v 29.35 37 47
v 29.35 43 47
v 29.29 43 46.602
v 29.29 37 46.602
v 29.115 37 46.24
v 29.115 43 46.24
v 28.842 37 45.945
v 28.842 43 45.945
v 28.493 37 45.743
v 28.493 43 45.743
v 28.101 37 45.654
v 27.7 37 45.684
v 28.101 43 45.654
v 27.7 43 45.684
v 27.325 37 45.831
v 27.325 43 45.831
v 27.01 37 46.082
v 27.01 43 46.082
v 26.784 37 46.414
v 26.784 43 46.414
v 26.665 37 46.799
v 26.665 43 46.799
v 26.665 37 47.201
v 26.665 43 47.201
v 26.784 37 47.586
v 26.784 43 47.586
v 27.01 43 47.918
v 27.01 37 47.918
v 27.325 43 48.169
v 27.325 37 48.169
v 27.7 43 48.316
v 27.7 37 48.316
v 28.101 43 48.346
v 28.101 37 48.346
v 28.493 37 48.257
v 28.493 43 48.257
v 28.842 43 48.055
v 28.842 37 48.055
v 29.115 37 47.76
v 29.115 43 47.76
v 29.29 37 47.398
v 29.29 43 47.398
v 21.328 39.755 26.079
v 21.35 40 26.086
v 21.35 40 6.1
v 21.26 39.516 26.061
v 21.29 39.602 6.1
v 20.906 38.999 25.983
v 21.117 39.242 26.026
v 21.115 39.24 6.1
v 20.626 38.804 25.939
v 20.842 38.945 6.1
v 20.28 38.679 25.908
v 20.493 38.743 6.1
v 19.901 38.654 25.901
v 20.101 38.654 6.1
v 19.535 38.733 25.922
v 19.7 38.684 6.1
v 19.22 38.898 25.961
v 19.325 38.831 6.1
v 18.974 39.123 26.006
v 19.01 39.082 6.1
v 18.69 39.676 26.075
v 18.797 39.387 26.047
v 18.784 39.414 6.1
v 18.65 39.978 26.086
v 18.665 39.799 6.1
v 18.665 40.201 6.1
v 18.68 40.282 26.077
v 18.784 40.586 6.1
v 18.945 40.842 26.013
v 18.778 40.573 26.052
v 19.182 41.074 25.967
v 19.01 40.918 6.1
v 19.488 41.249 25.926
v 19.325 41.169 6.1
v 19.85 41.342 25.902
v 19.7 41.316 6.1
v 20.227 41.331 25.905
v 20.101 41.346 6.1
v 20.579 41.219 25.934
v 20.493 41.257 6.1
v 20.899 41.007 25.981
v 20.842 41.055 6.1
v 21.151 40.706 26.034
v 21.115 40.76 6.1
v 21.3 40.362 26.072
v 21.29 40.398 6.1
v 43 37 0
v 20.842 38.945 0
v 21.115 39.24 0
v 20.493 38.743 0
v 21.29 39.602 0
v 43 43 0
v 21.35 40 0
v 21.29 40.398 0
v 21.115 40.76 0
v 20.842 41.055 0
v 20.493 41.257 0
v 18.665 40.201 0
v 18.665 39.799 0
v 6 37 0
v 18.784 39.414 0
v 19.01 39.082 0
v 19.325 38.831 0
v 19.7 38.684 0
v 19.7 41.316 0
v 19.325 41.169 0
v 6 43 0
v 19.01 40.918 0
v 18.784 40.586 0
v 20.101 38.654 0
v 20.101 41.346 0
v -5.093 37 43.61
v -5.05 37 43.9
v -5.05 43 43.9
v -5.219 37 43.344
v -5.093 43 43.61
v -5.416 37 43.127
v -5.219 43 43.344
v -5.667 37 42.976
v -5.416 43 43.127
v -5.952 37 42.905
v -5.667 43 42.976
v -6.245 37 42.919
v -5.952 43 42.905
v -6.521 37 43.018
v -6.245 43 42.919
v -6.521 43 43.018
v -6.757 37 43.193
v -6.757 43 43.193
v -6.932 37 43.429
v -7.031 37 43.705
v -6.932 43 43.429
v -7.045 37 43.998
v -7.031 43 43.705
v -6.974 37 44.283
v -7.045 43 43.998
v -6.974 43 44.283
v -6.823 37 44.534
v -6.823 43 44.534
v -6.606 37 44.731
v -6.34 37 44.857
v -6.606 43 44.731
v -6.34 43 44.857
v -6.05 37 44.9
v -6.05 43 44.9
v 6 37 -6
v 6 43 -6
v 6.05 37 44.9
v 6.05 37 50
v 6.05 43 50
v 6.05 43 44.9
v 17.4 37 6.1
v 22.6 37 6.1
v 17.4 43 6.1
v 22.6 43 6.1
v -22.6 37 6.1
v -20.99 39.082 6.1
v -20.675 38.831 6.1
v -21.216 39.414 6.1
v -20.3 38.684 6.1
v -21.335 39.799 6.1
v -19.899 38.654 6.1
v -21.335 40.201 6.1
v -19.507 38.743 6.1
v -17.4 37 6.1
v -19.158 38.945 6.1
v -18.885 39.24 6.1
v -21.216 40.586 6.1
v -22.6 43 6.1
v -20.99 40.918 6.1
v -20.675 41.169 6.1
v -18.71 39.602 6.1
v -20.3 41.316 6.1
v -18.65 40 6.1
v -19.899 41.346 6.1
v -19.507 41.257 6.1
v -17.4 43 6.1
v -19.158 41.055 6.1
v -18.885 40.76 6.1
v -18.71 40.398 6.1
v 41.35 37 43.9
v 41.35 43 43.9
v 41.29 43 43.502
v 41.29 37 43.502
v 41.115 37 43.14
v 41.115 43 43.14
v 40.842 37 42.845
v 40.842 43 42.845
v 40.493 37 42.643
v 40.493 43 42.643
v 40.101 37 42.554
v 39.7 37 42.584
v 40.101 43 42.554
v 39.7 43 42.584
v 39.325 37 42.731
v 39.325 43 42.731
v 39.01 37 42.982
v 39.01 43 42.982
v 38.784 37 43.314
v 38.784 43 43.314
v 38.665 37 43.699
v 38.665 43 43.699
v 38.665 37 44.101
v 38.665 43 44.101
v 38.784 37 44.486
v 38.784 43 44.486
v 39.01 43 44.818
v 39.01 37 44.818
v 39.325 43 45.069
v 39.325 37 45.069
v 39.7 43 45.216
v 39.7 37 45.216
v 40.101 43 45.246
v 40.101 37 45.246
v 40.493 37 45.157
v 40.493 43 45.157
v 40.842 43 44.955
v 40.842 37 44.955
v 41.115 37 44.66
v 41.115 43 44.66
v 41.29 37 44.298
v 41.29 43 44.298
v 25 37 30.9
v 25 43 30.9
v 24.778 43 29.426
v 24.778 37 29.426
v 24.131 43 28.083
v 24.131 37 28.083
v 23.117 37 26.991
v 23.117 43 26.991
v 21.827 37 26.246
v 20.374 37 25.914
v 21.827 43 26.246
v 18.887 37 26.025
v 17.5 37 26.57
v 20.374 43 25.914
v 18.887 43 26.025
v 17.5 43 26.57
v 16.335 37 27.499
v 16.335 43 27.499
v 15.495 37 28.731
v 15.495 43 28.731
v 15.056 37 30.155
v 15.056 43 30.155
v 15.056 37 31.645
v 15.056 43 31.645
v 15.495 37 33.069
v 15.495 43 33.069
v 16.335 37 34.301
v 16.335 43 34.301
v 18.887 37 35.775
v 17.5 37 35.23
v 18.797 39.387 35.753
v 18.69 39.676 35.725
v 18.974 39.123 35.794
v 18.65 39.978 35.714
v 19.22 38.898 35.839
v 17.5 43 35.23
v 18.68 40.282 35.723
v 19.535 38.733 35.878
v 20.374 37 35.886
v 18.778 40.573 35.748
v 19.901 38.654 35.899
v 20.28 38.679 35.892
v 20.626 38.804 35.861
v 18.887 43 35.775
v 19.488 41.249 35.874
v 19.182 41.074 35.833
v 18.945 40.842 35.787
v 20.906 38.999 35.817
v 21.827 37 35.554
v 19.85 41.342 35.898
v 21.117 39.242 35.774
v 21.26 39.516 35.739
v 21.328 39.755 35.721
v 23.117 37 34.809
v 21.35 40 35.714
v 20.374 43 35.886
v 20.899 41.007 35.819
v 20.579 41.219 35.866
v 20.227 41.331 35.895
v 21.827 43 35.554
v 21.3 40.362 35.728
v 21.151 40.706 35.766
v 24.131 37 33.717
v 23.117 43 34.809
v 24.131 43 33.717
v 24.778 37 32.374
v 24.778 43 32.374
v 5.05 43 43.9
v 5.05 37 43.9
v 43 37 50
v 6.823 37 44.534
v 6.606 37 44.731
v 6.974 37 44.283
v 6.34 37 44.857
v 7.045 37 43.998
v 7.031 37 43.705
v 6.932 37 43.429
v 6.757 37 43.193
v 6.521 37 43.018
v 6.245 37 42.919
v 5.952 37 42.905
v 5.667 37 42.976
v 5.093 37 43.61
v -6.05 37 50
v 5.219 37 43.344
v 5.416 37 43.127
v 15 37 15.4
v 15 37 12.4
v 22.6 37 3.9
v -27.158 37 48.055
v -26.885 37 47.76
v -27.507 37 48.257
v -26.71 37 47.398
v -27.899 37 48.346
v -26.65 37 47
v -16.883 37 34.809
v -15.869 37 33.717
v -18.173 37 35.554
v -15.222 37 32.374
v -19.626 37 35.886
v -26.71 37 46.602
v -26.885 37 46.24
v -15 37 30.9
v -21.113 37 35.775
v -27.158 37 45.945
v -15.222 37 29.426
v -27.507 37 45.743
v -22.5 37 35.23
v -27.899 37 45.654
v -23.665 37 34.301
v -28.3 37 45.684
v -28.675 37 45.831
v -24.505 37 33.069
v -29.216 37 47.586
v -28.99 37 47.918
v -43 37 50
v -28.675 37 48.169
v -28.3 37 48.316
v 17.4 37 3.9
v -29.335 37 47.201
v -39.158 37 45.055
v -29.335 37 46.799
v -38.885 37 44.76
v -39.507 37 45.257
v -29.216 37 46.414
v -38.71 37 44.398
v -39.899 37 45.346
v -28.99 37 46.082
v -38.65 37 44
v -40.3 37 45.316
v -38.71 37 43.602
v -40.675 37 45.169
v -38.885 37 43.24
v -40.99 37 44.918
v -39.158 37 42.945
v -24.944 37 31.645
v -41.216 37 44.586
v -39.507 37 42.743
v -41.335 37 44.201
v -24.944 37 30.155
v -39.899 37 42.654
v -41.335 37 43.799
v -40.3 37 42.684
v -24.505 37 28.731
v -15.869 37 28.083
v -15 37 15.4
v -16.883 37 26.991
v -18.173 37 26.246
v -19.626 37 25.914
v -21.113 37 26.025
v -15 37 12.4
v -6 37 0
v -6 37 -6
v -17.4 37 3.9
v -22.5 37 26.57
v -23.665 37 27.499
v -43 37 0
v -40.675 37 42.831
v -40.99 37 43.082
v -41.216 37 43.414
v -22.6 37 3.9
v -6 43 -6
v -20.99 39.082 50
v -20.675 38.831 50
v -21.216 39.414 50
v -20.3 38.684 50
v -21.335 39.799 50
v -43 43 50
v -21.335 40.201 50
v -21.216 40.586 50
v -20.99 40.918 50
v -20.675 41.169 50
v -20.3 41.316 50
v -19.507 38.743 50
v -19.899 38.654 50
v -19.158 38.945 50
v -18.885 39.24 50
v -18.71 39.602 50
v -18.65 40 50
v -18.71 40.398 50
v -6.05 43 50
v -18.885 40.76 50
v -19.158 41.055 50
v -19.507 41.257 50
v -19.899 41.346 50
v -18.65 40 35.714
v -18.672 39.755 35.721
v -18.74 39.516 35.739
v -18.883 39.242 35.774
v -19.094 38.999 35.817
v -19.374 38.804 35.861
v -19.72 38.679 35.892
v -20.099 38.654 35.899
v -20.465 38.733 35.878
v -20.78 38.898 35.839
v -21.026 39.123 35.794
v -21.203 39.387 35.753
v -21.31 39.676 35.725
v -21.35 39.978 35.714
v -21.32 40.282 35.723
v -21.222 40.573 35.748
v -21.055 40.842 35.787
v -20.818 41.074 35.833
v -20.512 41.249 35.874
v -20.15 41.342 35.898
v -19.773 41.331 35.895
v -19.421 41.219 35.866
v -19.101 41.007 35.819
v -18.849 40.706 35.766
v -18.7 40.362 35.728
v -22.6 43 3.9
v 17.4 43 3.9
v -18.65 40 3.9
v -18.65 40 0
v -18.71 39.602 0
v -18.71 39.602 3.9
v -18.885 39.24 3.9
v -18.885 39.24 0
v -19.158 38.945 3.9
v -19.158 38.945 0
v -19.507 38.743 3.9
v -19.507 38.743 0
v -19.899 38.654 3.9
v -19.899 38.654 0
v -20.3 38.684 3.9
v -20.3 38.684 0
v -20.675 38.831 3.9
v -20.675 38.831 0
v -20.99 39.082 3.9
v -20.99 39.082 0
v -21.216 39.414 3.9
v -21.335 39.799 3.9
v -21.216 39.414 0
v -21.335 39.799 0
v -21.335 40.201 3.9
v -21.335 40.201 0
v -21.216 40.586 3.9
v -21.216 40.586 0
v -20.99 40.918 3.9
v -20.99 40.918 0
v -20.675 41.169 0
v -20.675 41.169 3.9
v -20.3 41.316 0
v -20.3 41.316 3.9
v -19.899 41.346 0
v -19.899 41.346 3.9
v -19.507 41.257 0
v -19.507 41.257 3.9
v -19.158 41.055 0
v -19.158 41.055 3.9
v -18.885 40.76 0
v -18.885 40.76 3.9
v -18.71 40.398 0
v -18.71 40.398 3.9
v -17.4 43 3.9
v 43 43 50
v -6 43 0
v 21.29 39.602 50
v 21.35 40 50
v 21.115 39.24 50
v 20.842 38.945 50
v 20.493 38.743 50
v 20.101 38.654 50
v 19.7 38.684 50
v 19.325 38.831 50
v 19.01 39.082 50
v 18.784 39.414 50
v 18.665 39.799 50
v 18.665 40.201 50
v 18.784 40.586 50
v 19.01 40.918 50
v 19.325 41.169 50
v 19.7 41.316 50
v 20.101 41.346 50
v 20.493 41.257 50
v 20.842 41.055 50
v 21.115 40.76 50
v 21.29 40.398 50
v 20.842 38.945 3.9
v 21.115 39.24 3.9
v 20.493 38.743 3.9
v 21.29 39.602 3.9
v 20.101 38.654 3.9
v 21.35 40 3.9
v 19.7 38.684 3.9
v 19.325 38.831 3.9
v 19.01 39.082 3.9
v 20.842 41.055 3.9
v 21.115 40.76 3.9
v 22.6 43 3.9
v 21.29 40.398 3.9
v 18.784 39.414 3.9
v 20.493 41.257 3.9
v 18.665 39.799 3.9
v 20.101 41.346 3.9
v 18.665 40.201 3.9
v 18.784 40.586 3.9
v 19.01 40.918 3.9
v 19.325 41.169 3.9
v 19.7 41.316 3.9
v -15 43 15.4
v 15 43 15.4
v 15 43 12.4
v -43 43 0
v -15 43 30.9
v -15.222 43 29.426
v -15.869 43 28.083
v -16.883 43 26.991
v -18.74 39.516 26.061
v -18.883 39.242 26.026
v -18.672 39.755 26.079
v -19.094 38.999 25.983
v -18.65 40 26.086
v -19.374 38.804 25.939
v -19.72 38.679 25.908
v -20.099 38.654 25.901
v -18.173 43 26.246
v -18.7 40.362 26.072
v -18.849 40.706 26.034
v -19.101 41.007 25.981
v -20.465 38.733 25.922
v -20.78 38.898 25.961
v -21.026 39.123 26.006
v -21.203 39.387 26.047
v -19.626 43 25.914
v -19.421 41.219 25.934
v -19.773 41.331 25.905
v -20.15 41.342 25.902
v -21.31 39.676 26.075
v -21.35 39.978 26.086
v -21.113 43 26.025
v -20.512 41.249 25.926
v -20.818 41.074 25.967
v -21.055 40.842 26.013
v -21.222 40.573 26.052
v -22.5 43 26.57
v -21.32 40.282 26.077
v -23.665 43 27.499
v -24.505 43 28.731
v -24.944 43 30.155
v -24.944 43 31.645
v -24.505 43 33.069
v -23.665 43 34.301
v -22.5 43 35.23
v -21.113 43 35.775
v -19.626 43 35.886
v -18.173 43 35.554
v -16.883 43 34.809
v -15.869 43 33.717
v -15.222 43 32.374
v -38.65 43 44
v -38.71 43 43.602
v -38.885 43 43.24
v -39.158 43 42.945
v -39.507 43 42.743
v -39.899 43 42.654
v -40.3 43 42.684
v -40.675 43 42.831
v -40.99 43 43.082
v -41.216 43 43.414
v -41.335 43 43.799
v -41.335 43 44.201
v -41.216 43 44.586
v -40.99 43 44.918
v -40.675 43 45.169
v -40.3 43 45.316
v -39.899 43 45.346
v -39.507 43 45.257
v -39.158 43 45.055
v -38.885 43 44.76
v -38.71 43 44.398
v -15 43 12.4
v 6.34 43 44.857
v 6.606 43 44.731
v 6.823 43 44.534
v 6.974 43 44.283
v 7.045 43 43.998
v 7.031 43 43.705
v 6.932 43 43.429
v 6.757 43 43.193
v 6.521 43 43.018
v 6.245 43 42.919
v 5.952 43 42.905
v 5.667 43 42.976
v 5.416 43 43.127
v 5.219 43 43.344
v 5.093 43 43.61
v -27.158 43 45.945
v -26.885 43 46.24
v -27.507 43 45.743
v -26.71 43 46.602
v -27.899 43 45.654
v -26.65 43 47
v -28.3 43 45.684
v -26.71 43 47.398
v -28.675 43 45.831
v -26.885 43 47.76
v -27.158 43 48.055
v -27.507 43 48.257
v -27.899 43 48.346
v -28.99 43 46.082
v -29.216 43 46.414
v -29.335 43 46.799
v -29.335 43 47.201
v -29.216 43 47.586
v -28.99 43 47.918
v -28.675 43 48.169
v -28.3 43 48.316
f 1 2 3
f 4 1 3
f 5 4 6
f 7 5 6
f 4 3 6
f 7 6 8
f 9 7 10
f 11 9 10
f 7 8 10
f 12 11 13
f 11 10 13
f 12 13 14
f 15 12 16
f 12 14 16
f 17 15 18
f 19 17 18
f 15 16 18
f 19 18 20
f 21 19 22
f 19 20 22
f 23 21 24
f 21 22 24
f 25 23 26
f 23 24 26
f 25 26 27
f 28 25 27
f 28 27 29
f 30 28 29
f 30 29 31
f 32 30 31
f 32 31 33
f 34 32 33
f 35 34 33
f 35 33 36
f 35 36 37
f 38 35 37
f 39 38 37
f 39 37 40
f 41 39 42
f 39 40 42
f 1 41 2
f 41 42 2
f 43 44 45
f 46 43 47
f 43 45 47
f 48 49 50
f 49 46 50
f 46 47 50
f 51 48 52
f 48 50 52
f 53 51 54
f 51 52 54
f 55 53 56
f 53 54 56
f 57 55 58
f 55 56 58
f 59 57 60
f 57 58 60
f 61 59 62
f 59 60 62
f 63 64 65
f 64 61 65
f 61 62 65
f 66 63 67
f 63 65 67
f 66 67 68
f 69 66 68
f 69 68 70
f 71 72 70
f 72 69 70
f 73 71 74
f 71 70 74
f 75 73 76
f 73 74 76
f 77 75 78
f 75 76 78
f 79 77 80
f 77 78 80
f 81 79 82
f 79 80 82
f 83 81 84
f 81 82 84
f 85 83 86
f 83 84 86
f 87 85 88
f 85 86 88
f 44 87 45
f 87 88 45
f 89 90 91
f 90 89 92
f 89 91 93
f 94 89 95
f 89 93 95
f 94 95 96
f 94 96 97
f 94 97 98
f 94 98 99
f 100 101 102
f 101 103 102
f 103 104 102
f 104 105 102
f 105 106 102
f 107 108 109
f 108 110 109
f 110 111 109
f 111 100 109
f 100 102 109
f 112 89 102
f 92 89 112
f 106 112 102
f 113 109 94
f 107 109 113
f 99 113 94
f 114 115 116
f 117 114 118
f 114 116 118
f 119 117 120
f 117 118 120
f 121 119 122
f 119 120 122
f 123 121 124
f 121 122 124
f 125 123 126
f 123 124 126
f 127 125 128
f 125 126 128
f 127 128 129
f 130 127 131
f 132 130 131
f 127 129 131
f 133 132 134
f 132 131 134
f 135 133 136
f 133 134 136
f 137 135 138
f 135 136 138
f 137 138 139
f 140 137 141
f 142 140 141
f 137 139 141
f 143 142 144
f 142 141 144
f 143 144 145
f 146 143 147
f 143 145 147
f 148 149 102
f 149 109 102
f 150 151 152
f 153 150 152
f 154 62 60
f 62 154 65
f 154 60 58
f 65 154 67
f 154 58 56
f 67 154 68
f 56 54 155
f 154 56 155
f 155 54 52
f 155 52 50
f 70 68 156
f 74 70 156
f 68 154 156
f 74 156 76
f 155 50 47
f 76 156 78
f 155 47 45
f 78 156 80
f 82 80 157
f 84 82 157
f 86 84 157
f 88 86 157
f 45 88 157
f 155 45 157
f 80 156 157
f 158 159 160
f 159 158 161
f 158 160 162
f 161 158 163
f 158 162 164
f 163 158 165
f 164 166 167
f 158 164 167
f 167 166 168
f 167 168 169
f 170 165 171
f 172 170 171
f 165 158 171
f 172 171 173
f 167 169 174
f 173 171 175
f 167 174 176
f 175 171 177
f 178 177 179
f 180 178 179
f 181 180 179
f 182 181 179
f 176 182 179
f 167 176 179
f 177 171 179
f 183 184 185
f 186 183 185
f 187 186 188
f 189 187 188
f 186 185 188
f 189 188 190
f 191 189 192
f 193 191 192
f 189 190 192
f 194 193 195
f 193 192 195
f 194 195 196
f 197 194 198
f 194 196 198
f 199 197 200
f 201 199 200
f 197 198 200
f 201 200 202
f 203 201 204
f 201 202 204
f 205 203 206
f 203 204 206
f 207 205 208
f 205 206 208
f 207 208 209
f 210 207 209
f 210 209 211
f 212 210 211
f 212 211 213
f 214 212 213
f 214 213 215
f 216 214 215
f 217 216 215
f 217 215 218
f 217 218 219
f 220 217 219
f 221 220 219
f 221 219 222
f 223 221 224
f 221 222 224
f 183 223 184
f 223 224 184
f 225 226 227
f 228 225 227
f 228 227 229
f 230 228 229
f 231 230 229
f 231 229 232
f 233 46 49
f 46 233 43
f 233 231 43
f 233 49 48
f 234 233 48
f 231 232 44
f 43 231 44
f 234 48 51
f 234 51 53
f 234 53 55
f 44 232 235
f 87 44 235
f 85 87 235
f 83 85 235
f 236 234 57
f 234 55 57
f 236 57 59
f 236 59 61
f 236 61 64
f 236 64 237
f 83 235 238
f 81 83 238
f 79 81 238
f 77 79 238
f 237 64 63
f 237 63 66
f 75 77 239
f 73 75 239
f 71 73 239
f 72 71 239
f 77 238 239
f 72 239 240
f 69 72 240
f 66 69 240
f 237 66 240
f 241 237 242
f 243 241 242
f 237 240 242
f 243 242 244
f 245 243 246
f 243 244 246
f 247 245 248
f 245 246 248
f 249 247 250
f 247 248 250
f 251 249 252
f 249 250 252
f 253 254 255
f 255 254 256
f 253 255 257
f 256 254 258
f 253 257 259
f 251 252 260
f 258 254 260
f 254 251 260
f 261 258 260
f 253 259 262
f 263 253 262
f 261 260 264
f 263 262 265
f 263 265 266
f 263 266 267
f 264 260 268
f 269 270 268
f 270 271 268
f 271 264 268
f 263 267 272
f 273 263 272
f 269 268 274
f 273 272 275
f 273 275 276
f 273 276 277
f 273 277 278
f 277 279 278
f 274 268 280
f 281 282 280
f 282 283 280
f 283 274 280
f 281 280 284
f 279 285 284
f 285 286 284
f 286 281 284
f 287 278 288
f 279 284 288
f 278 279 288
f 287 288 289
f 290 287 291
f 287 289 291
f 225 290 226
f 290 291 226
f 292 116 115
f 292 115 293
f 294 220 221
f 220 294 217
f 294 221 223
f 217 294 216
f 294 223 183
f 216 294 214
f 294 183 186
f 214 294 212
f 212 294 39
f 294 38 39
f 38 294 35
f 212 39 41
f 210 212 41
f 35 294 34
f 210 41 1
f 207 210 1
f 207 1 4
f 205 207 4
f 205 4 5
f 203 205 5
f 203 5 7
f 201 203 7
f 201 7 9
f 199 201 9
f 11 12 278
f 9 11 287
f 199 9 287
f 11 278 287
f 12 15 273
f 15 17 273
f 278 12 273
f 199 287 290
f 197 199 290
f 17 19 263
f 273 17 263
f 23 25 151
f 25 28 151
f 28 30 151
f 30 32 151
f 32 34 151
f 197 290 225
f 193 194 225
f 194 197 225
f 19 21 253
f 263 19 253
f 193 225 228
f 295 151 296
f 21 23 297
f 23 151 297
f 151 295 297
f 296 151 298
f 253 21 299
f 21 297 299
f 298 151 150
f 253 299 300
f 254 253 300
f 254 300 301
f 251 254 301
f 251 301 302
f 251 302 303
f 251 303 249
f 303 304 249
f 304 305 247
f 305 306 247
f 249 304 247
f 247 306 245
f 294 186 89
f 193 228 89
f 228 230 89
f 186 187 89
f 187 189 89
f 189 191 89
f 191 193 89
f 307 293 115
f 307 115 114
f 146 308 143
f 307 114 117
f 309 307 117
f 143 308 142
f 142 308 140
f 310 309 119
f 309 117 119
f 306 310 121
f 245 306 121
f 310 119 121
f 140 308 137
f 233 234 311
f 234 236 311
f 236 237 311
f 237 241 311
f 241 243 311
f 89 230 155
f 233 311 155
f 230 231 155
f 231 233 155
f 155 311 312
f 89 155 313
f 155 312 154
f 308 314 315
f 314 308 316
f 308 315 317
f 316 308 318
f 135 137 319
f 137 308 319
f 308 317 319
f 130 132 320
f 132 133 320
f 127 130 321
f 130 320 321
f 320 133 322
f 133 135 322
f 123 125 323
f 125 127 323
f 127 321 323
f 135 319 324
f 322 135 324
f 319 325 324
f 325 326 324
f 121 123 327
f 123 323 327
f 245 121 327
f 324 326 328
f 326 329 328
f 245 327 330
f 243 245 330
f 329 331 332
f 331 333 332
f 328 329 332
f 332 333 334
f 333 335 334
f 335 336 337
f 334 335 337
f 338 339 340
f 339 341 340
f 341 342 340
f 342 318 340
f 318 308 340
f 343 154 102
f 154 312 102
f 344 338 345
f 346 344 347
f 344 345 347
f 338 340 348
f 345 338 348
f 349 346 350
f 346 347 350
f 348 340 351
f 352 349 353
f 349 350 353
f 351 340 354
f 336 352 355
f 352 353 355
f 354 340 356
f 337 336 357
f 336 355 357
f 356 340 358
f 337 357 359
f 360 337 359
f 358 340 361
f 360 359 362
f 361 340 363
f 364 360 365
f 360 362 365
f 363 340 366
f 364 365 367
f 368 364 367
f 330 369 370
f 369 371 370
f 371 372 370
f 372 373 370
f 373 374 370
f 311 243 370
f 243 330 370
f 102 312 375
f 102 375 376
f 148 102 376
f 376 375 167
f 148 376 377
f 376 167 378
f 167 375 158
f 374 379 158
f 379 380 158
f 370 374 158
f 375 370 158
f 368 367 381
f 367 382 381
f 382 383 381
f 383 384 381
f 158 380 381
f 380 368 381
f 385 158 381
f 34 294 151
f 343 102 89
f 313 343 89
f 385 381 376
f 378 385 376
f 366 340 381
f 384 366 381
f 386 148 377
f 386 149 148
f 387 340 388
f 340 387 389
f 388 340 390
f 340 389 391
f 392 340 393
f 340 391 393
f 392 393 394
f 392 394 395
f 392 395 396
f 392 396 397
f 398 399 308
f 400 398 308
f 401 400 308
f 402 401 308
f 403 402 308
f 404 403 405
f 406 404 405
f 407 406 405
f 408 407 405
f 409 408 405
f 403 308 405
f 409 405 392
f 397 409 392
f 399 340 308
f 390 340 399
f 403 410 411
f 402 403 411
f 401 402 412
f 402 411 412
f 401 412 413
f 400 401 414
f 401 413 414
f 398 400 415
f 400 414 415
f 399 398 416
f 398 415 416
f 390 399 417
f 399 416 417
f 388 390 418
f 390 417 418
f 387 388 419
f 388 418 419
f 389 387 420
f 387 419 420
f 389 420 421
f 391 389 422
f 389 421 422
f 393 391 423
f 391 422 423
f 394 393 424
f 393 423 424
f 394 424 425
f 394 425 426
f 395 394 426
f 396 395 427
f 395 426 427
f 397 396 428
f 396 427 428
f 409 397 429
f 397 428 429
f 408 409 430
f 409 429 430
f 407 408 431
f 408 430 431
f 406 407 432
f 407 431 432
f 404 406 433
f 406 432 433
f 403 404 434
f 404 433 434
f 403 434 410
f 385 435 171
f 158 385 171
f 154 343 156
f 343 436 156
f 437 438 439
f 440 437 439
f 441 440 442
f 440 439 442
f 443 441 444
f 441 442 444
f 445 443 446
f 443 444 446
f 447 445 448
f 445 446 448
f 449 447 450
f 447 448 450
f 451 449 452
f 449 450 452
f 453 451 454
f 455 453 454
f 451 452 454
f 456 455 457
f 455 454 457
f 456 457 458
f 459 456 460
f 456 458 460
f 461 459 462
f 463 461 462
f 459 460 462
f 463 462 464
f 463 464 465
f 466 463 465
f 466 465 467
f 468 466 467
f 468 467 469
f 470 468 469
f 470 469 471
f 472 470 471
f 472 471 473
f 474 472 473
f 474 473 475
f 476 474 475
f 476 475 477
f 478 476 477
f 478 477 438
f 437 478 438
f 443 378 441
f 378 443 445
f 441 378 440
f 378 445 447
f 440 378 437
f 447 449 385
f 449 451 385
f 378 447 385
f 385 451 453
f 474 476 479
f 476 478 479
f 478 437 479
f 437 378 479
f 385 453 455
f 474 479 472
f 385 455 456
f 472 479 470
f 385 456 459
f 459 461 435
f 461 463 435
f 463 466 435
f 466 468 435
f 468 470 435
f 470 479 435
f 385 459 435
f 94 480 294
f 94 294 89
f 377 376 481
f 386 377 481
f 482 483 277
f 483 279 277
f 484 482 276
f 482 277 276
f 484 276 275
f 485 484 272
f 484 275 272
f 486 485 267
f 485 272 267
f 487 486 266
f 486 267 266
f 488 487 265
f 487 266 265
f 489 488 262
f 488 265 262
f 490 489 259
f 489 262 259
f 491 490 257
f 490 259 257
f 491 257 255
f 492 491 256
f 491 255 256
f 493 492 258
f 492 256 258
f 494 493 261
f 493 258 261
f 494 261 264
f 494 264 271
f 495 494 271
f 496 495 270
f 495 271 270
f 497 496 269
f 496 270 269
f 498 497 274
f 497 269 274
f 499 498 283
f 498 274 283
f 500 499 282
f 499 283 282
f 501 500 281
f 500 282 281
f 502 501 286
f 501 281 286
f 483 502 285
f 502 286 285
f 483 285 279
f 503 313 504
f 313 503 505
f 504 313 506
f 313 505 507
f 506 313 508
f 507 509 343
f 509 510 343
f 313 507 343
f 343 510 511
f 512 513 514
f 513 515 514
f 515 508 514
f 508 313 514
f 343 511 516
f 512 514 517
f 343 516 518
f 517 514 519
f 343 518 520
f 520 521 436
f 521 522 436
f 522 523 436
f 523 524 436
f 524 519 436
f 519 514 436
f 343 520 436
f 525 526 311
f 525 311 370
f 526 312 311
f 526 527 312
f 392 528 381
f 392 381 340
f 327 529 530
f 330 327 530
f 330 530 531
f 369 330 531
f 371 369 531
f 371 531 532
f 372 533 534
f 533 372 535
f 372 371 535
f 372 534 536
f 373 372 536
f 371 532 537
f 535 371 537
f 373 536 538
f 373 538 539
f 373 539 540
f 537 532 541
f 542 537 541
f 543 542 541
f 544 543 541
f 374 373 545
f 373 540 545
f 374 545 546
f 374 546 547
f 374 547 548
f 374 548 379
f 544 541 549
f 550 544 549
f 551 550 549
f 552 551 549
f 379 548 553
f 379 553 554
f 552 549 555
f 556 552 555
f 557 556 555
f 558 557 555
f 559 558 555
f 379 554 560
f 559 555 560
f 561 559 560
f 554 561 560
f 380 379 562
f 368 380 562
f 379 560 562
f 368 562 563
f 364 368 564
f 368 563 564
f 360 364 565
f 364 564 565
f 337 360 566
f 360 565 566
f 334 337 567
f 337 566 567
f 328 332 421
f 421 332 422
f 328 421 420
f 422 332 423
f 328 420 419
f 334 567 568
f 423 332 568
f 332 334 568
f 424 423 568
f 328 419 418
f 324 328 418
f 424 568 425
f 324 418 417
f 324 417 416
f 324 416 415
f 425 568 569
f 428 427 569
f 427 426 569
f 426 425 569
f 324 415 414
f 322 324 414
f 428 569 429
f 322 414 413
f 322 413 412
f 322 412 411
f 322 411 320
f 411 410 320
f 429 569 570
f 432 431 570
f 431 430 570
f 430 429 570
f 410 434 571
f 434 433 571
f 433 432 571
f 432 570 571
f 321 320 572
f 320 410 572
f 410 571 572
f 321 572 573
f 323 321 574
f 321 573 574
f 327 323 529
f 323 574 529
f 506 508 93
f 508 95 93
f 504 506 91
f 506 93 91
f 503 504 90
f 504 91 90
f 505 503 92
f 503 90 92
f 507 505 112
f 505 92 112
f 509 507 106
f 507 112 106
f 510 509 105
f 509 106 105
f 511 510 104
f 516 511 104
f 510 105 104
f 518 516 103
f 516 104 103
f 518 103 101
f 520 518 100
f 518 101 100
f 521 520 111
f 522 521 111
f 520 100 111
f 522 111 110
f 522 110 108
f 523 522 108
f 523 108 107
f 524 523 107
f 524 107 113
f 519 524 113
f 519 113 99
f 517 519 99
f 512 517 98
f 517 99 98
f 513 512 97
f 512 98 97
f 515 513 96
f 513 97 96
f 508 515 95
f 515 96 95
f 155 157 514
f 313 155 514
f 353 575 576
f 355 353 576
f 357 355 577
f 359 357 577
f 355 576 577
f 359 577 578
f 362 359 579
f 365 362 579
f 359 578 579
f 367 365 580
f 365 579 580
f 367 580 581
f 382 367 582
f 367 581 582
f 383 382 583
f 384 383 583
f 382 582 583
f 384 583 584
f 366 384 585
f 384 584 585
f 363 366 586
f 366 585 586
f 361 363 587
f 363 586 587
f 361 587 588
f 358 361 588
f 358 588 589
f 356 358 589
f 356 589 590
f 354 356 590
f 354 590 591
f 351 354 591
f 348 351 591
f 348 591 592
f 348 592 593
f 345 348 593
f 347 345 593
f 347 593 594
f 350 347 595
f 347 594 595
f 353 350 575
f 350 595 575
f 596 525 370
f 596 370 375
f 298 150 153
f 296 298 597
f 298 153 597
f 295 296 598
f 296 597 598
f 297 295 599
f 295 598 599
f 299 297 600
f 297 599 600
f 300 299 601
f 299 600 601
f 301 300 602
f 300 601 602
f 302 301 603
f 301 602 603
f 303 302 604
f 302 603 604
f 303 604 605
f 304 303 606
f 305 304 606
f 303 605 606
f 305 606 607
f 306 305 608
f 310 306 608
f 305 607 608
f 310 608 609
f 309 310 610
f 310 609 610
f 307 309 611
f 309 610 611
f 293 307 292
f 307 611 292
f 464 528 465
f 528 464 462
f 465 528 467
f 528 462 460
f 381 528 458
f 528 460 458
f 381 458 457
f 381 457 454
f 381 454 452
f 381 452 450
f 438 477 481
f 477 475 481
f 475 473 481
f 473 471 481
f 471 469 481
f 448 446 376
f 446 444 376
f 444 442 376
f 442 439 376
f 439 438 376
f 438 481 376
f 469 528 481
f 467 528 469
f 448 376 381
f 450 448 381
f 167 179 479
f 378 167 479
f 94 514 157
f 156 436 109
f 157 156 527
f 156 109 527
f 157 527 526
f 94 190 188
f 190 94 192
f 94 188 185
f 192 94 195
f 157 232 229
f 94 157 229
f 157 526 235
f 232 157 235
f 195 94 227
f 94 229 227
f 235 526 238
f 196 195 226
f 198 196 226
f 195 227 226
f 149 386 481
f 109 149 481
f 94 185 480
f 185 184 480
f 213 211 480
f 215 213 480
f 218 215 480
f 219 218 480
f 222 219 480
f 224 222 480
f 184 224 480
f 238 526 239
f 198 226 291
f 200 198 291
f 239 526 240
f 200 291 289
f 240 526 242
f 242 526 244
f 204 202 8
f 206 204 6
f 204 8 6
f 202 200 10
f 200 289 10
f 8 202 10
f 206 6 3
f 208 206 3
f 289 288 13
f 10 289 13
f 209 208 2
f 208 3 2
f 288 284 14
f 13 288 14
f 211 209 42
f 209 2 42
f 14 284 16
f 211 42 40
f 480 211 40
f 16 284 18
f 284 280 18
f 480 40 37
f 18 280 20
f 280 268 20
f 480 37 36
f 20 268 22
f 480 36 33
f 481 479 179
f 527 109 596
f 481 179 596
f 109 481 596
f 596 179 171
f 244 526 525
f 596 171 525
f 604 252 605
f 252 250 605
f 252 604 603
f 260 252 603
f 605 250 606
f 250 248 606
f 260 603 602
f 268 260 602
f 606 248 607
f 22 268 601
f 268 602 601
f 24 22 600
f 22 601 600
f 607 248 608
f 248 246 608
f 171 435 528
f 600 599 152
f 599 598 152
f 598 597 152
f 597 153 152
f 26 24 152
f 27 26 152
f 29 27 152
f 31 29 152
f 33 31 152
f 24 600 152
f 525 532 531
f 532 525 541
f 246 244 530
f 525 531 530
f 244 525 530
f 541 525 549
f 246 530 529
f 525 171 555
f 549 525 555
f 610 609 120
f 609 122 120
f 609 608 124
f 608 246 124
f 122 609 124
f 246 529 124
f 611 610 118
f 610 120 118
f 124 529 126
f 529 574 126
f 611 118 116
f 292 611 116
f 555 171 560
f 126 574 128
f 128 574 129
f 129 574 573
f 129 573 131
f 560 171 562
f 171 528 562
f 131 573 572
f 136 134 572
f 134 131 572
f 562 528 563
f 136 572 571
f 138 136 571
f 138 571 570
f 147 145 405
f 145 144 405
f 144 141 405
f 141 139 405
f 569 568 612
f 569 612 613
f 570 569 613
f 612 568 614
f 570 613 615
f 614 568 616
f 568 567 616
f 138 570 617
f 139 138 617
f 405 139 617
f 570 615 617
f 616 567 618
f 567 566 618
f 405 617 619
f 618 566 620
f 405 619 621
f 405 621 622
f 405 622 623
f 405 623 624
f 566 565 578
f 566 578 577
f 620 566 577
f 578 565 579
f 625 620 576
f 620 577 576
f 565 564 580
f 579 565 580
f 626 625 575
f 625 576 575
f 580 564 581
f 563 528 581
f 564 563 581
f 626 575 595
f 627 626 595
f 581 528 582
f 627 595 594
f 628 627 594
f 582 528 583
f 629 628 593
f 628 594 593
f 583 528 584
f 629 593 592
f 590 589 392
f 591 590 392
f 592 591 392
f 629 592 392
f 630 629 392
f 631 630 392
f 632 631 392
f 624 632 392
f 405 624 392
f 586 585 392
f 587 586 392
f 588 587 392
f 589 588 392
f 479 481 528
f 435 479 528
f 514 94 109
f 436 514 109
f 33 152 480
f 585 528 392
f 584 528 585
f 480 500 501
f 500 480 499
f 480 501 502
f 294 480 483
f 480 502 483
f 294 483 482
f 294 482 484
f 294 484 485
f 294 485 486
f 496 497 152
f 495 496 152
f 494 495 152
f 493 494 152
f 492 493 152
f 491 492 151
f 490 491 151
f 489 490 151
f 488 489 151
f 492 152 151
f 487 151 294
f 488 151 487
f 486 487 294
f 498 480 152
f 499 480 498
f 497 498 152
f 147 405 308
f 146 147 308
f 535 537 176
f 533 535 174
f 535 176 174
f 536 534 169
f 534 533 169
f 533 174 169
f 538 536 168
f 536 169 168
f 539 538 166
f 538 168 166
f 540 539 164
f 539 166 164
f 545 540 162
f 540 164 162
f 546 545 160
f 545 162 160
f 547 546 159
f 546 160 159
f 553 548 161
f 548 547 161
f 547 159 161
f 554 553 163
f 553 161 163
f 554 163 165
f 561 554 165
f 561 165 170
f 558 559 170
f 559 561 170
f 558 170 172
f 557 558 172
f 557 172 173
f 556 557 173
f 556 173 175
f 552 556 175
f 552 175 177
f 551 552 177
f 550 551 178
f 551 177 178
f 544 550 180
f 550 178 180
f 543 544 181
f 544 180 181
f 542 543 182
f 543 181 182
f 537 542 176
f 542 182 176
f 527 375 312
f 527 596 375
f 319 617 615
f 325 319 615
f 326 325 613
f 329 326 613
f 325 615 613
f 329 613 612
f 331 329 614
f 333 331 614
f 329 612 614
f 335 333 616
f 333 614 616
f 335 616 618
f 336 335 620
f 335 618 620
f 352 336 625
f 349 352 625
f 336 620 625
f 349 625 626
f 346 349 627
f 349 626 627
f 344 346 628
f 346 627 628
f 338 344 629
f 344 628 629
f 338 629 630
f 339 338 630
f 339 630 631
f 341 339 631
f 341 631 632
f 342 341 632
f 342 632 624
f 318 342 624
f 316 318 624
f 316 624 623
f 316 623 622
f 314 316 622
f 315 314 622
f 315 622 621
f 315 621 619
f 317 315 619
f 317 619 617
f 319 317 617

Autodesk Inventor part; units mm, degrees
ref_plane "YZ Plane" through (0, 0, 0) normal (1, 0, 0) x (0, 1, 0)
ref_plane "XZ Plane" through (0, 0, 0) normal (0, 1, 0) x (-1, 0, 0)
ref_plane "XY Plane" through (0, 0, 0) normal (0, 0, 1) x (1, 0, 0)
ref_plane "작업 평면1" through (0, 0, 0) normal (0, 0, 1) x (1, 0, 0)
sketch "스케치1" plane through (0, 0, 0) normal (0, 0, 1) x (1, 0, 0)
  circle A0 centre (-20, 40) radius 1.35
  circle A1 centre (20, 40) radius 1.35
  line L0 (6.05, 36.95) -> (-6.05, 36.95)
  line L1 (-6.05, 36.95) -> (-6.05, 43.05)
  line L2 (-6.05, 43.05) -> (6.05, 43.05)
  line L3 (6.05, 43.05) -> (6.05, 36.95)
  line L4 (-37, 6) -> (-37, 45)
  line L5 (-37, 6) -> (-43, 6)
  line L6 (-43, 6) -> (-43, -6)
  line L7 (-43, -6) -> (-37, -6)
  line L8 (-37, -6) -> (-37, -35)
  line L9 (-37, -35) -> (37, -35)
  line L10 (37, -35) -> (37, -6)
  line L11 (37, -6) -> (43, -6)
  line L12 (43, -6) -> (43, 6)
  line L13 (43, 6) -> (37, 6)
  line L14 (37, 6) -> (37, 45)
  line L15 (-37, 45) -> (37, 45)
  circle A2 centre (-28.8, -30.8) radius 1.35
  circle A3 centre (28.8, -30.8) radius 1.35
  circle A4 centre (28.8, 30.8) radius 1.35
  circle A5 centre (-20.8, -30.8) radius 1.6
  circle A6 centre (-20.8, 30.8) radius 1.6
  circle A7 centre (20.8, -30.8) radius 1.6
  circle A8 centre (20.8, 30.8) radius 1.6
  circle A9 centre (-28.8, 30.8) radius 1.35
  line L16 (31.1, -8.4) -> (31.1, -13.6)
  line L17 (31.1, -13.6) -> (28.9, -13.6)
  line L18 (28.9, -13.6) -> (28.9, -8.4)
  line L19 (28.9, -8.4) -> (31.1, -8.4)
  line L20 (-31.1, -8.4) -> (-28.9, -8.4)
  line L21 (-28.9, -8.4) -> (-28.9, -13.6)
  line L22 (-28.9, -13.6) -> (-31.1, -13.6)
  line L23 (-31.1, -13.6) -> (-31.1, -8.4)
  line L24 (-31.1, 13.6) -> (-28.9, 13.6)
  line L25 (-28.9, 13.6) -> (-28.9, 8.4)
  line L26 (-28.9, 8.4) -> (-31.1, 8.4)
  line L27 (-31.1, 8.4) -> (-31.1, 13.6)
  line L28 (28.9, 13.6) -> (31.1, 13.6)
  line L29 (31.1, 13.6) -> (31.1, 8.4)
  line L30 (31.1, 8.4) -> (28.9, 8.4)
  line L31 (28.9, 8.4) -> (28.9, 13.6)
  line L32 (37, 37) -> (-37, 37)
  line L33 (-37, 37) -> (-37, 43)
  line L34 (-37, 43) -> (37, 43)
  line L35 (37, 43) -> (37, 37)
  line L36 (37, 37) -> (-37, 43) construction
  line L37 (-37, 37) -> (37, 43) construction
  point P0 (0, 0)
  point P1 (0, 40)
  dimension "d0" = 74
  dimension "d1" = 6
extrude "돌출1" add sketch "스케치1" along normal blind 50 contours L32 L1 L34 L3 | L3 L34 L14 L32 | L32 L4 L34 L1
sketch "스케치2" plane through (0, 0, 50) normal (0, 0, 1) x (1, 0, 0)
  line L0 (6.05, 43) -> (-6.05, 43)
  line L1 (-6.05, 43) -> (-6.05, 37)
  line L2 (-6.05, 37) -> (6.05, 37)
  line L3 (6.05, 37) -> (6.05, 43)
  line L4 (6.05, 43) -> (-6.05, 37) construction
  line L5 (-6.05, 43) -> (6.05, 37) construction
  point P0 (0, 0)
  point P1 (0, 40)
  dimension "d4" = 12.1
  dimension "d5" = 6
extrude "돌출2" cut sketch "스케치2" against normal blind 6.1
sketch "스케치3" plane through (0, 0, 0) normal (0, 0, -1) x (-1, 0, 0)
  line L0 (-6, 37) -> (6, 37)
  line L1 (6, 37) -> (6, 43)
  line L2 (6, 43) -> (-6, 43)
  line L3 (-6, 43) -> (-6, 37)
  line L4 (-6, 37) -> (6, 43) construction
  line L5 (6, 37) -> (-6, 43) construction
  point P0 (0, 0)
  point P1 (0, 40)
  dimension "d8" = 12
  dimension "d9" = 6
extrude "돌출3" add sketch "스케치3" along normal blind 6
sketch "스케치4" plane through (37, 43, 50) normal (0, 1, 0) x (1, 0, 0)
  line L0 (-58.35, 0) -> (-58.35, 50)
  line L1 (-55.65, 0) -> (-55.65, 50)
  line L2 (-18.35, 0) -> (-18.35, 50)
  line L3 (-15.65, 0) -> (-15.65, 50)
  line L4 (-15.65, 35) -> (-18.35, 35)
  line L5 (-55.65, 35) -> (-58.35, 35)
  line L6 (-14.4, 36.1) -> (-19.6, 33.9) construction
  line L7 (-19.6, 36.1) -> (-14.4, 33.9) construction
  line L8 (-54.4, 36.1) -> (-59.6, 36.1)
  line L9 (-59.6, 36.1) -> (-59.6, 33.9)
  line L10 (-59.6, 33.9) -> (-54.4, 33.9)
  line L11 (-54.4, 33.9) -> (-54.4, 36.1)
  line L12 (-54.4, 36.1) -> (-59.6, 33.9) construction
  line L13 (-59.6, 36.1) -> (-54.4, 33.9) construction
  circle A0 centre (-9, 3) radius 1.35
  circle A1 centre (-65, 3) radius 1.35
  line L14 (-14.4, 46.1) -> (-19.6, 46.1)
  line L15 (-19.6, 46.1) -> (-19.6, 43.9)
  line L16 (-19.6, 43.9) -> (-14.4, 43.9)
  line L17 (-14.4, 43.9) -> (-14.4, 46.1)
  line L18 (-14.4, 46.1) -> (-19.6, 43.9) construction
  line L19 (-19.6, 46.1) -> (-14.4, 43.9) construction
  line L20 (-54.4, 46.1) -> (-59.6, 46.1)
  line L21 (-59.6, 46.1) -> (-59.6, 43.9)
  line L22 (-59.6, 43.9) -> (-54.4, 43.9)
  line L23 (-54.4, 43.9) -> (-54.4, 46.1)
  line L24 (-54.4, 46.1) -> (-59.6, 43.9) construction
  line L25 (-59.6, 46.1) -> (-54.4, 43.9) construction
  point P0 (-37, 50)
  point P1 (-17, 35)
  point P2 (-57, 35)
  point P3 (-17, 45)
  point P4 (-57, 45)
  dimension "d12" = 5.2
  dimension "d13" = 2.2
  dimension "d14" = 5.2
  dimension "d15" = 2.2
  dimension "d16" = 2.7
  dimension "d17" = 2.7
  dimension "d20" = 5.2
  dimension "d21" = 2.2
  dimension "d22" = 5.2
  dimension "d23" = 2.2
extrude "돌출5" cut sketch "스케치4" against normal blind 50 contours L22 L21 L20 L0 | L0 L20 L1 L22 | L1 L20 L23 L22 | L16 L15 L14 L2 | L2 L14 L3 L16 | L3 L14 L17 L16 | A0 | A1
sketch "스케치5" plane through (-37, 37, 0) normal (-1, 0, 0) x (0, 0, 1)
  line L0 (50, 6) -> (0, 6)
  line L1 (0, 6) -> (0, 0)
  line L2 (0, 0) -> (50, 0)
  line L3 (50, 0) -> (50, 6)
  point P0 (0, -37)
extrude "돌출6" add sketch "스케치5" along normal blind 6
sketch "스케치6" plane through (37, 37, 0) normal (1, 0, 0) x (0, 0, -1)
  line L0 (-50, 0) -> (0, 0)
  line L1 (0, 0) -> (0, 6)
  line L2 (0, 6) -> (-50, 6)
  line L3 (-50, 6) -> (-50, 0)
  point P0 (0, -37)
  dimension "d28" = 6
extrude "돌출7" add sketch "스케치6" along normal blind 6
sketch "스케치7" plane through (-6.05, 43, 43.9) normal (0, 1, 0) x (1, 0, 0)
  circle A0 centre (26.05, 13) radius 5
  circle A1 centre (-13.95, 13) radius 5
  line L0 (21.05, 28.5) -> (-8.95, 28.5)
  line L1 (-8.95, 28.5) -> (-8.95, 31.5)
  line L2 (-8.95, 31.5) -> (21.05, 31.5)
  line L3 (21.05, 31.5) -> (21.05, 28.5)
  line L4 (21.05, 28.5) -> (-8.95, 31.5) construction
  line L5 (-8.95, 28.5) -> (21.05, 31.5) construction
  point P0 (6.05, 43.9)
  point P1 (6.05, 30)
  dimension "d31" = 10
  dimension "d32" = 10
  dimension "d35" = 3
extrude "돌출9" cut sketch "스케치7" against normal blind 10
sketch "스케치8" plane through (-6.05, 43, 43.9) normal (0, 1, 0) x (1, 0, 0)
  line L0 (-8.95, 28.5) -> (-8.95, 31.5)
  line L1 (-8.95, 31.5) -> (21.05, 31.5)
  line L2 (21.05, 31.5) -> (21.05, 28.5)
  line L3 (21.05, 28.5) -> (-8.95, 28.5)
  circle A0 centre (-13.95, 13) radius 5
  circle A1 centre (26.05, 13) radius 5
  circle A2 centre (-21.95, -3.1) radius 1.35
  line L4 (-16.55, 37.8) -> (-16.55, 40)
  line L5 (-16.55, 40) -> (-11.35, 40)
  line L6 (-11.35, 40) -> (-11.35, 37.8)
  line L7 (-11.35, 37.8) -> (-16.55, 37.8)
  circle A3 centre (34.05, -3.1) radius 1.35
  line L8 (23.45, 40) -> (28.65, 40)
  line L9 (28.65, 40) -> (28.65, 37.8)
  line L10 (28.65, 37.8) -> (23.45, 37.8)
  line L11 (23.45, 37.8) -> (23.45, 40)
  line L12 (0, -6.1) -> (0, 0)
  line L13 (0, 0) -> (12.1, 0)
  line L14 (12.1, 0) -> (12.1, -6.1)
  line L15 (12.1, -6.1) -> (49.05, -6.1)
  line L16 (49.05, 43.9) -> (49.05, -6.1)
  line L17 (12.05, 43.9) -> (49.05, 43.9)
  line L18 (12.05, 43.9) -> (12.05, 49.9)
  line L19 (0.05, 49.9) -> (12.05, 49.9)
  line L20 (0.05, 43.9) -> (0.05, 49.9)
  line L21 (0.05, 43.9) -> (-36.95, 43.9)
  line L22 (-36.95, -6.1) -> (-36.95, 43.9)
  line L23 (0, -6.1) -> (-36.95, -6.1)
  circle A4 centre (-33.95, -0.1) radius 1.35
  circle A5 centre (46.05, 0) radius 1.35
  point P0 (6.05, 43.9)
  dimension "d38" = 2.7
  dimension "d41" = 2.7
extrude "돌출11" cut sketch "스케치8" against normal blind 10 contours A4 | A5
sketch "스케치9" plane through (-6.05, 43, 43.9) normal (0, 1, 0) x (1, 0, 0)
  line L0 (0, 0) -> (12.1, 0)
  line L1 (12.1, 0) -> (12.1, -6.1)
  line L2 (0, -6.1) -> (0, 0)
  circle A0 centre (12.1, 0) radius 1
  circle A1 centre (0, 0) radius 1
  point P0 (6.05, 43.9)
  point P1 (12.1, -1)
  point P2 (11.1, 0)
  dimension "d44" = 2
  dimension "d45" = 2
extrude "돌출12" cut sketch "스케치9" against normal blind 10 contours L2 A1 L0 | L0 A1 L2 | A0 L1 L0 picked at (11.443, 0.0798)
properties part number "front of head" material "PMMA 플라스틱"
